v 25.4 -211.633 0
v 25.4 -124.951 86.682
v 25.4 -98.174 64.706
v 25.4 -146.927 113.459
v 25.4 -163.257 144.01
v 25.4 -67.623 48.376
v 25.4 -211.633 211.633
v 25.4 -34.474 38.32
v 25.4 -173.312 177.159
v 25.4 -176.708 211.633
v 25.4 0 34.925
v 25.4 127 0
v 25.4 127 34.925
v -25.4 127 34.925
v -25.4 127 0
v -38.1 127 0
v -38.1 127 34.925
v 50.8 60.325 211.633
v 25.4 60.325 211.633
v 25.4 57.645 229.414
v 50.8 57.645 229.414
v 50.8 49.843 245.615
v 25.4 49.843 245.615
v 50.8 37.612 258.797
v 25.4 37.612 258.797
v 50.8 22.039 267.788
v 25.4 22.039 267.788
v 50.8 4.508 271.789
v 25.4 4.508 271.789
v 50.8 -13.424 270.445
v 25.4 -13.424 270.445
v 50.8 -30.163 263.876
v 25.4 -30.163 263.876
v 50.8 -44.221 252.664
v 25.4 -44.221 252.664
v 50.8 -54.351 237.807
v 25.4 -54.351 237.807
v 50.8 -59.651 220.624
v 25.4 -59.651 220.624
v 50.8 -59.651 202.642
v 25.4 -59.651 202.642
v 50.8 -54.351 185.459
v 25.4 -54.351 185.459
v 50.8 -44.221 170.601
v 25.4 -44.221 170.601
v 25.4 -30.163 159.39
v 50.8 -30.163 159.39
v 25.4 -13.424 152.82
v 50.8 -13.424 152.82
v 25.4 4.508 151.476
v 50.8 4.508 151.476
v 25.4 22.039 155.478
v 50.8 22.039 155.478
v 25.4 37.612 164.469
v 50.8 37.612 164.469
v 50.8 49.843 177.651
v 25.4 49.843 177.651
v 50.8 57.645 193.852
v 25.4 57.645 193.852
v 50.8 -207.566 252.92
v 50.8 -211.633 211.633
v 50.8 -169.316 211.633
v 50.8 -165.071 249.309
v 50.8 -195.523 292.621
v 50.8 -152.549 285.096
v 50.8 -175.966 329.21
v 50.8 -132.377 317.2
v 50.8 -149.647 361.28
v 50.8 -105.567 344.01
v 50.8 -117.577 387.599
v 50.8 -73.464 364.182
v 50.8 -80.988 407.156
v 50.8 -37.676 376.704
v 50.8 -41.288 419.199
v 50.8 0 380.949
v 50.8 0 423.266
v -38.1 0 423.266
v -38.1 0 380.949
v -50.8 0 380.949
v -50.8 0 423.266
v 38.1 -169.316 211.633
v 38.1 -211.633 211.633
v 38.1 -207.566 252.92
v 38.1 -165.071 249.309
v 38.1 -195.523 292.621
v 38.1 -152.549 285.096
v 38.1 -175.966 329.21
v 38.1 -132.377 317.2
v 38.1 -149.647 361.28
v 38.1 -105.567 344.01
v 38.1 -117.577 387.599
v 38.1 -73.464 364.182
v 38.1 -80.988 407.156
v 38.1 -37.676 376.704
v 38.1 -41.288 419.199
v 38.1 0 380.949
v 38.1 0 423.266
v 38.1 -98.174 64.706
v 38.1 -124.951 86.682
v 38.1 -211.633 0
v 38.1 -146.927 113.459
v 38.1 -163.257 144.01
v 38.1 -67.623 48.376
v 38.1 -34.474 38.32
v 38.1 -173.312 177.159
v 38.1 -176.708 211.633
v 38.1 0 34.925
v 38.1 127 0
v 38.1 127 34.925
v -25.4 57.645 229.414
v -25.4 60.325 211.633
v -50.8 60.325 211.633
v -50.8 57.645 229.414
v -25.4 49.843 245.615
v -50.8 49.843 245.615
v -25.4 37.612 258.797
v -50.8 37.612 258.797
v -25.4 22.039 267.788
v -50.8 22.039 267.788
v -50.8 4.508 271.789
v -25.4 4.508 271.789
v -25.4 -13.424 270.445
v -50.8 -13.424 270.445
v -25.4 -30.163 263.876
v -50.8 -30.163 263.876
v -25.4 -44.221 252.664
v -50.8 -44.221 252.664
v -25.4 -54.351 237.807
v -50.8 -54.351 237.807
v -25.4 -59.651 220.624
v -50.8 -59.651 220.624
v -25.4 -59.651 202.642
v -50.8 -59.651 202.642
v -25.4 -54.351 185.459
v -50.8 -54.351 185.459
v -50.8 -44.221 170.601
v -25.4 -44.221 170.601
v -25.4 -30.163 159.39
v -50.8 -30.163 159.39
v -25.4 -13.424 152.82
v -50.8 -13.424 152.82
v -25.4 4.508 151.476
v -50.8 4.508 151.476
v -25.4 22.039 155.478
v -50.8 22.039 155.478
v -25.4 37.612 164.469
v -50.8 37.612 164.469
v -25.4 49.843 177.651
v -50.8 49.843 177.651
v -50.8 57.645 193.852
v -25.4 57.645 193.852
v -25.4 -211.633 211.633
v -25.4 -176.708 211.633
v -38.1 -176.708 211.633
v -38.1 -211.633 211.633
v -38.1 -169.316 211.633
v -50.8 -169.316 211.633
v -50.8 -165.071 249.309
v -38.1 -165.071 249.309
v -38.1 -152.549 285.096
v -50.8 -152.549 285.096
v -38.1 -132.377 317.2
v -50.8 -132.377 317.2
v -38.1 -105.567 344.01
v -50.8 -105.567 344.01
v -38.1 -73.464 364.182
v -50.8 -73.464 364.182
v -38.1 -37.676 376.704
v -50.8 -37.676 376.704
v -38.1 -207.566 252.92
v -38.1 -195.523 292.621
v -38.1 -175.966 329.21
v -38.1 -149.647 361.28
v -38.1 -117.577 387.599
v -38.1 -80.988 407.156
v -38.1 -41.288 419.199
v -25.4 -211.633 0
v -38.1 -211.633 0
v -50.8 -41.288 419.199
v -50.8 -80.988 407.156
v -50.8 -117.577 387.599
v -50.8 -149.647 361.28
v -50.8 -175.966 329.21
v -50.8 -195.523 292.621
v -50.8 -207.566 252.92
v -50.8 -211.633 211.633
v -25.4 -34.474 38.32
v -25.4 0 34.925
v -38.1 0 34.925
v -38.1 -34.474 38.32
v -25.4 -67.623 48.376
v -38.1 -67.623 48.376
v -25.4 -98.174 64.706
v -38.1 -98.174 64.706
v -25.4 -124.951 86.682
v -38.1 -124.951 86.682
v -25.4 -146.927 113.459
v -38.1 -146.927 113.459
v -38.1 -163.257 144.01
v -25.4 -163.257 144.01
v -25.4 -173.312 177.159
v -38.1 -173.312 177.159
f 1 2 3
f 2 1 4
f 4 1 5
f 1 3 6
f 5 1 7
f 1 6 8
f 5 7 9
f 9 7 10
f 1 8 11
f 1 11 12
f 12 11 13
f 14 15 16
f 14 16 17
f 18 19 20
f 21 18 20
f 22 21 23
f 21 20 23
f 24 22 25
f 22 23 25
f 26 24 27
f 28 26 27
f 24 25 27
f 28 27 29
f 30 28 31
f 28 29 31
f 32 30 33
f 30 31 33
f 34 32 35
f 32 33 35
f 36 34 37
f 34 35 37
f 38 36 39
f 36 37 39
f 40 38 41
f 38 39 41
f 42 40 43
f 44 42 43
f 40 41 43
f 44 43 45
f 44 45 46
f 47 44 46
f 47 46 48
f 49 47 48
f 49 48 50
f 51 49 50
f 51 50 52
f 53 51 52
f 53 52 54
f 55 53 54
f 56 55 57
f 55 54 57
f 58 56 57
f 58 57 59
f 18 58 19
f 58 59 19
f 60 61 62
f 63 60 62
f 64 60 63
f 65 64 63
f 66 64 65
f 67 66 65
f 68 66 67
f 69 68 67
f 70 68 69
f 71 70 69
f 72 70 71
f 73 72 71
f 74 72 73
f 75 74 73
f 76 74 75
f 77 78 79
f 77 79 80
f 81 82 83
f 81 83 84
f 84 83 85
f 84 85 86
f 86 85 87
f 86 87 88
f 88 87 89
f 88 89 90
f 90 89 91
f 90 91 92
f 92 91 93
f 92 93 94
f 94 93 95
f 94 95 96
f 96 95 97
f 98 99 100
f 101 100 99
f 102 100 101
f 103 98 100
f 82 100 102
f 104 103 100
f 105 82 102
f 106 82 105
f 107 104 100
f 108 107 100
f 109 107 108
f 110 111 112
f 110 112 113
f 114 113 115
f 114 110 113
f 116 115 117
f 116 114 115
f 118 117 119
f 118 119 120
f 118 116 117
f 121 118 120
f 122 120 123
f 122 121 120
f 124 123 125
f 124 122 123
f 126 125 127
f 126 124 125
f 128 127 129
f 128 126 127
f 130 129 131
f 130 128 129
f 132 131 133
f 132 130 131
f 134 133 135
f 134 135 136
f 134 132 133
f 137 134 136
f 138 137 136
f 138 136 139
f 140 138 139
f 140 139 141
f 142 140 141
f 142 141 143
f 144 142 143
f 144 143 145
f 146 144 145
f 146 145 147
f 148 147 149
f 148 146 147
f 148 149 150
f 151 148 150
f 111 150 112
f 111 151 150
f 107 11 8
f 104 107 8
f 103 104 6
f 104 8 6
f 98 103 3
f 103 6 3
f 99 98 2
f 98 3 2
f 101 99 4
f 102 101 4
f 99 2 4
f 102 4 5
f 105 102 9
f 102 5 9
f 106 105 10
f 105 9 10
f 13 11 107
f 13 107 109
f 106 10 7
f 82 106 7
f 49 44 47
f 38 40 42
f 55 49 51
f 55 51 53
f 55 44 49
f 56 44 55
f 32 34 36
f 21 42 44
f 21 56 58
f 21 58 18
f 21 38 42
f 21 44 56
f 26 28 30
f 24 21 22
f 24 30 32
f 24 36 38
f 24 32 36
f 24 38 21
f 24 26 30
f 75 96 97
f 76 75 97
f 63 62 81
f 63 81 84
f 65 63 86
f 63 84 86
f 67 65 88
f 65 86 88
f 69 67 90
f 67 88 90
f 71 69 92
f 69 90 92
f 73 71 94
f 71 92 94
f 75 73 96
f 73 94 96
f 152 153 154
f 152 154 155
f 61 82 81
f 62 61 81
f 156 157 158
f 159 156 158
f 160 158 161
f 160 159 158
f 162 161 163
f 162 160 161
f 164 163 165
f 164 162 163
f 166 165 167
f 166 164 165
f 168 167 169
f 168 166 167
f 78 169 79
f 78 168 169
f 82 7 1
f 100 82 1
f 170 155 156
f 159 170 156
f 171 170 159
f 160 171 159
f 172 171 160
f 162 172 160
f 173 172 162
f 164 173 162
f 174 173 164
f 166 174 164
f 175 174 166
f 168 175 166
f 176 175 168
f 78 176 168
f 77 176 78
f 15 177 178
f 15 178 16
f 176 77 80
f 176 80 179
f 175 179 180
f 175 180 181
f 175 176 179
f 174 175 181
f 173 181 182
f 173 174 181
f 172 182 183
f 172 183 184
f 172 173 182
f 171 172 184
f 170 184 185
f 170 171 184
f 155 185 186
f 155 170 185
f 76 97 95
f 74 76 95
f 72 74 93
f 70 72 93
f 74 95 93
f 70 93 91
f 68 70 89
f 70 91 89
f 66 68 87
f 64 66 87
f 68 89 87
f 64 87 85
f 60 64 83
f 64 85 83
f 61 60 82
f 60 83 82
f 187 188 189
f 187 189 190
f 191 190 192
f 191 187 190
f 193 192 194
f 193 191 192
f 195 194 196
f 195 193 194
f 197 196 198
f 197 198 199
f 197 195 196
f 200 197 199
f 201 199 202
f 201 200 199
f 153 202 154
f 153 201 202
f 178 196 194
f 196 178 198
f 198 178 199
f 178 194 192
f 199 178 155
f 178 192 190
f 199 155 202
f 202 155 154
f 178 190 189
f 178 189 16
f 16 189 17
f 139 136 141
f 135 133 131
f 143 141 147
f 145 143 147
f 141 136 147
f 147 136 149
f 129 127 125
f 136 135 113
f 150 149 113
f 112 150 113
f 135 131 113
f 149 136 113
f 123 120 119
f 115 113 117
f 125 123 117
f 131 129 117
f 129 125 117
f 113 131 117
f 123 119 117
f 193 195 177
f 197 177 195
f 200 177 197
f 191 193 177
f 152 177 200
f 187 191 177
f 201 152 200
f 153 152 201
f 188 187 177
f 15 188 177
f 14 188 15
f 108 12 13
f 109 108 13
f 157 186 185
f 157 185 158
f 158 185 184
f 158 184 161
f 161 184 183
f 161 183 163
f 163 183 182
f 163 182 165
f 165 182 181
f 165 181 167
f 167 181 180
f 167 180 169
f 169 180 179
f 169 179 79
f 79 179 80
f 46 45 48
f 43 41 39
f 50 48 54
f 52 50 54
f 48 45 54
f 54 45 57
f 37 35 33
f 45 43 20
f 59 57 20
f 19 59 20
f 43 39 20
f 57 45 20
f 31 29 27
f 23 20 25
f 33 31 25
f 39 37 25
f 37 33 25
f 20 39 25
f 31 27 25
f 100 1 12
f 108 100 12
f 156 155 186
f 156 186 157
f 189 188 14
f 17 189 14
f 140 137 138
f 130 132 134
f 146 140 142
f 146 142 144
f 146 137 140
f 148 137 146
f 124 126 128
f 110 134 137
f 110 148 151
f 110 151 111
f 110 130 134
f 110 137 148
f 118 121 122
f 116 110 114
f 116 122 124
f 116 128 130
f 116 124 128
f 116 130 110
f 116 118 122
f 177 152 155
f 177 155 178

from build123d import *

# Parameters (mm, degrees)
F4_R      = 60.325
F5_DEPTH  = 25.4
F4_W      = 127
F4_H      = 34.925
F6_DEPTH  = 12.7
F7_DEPTH  = 12.7
F10_DEPTH = 12.7


# Not quite as in the source:
# - a variable given as a bare number and used for a length is read in inches; the dataset says mm whatever the document's units were


with BuildPart() as f5:
    # F4 (on offset) → F5 (new body)
    with BuildSketch(Plane.YZ.offset(25.4)):
        with Locations((0, 211.6328)):
            Circle(F4_R)
    extrude(amount=F5_DEPTH)


with BuildPart() as f6:
    # F4 (on offset) → F6 (new body)
    with BuildSketch(Plane.YZ.offset(25.4)):
        with BuildLine():
            ThreePointArc((-211.6328, 211.6328), (-149.6469880015, 61.9858119985), (0, 0))
            Line((0, 0), (0, 34.925))
            ThreePointArc((0, 34.925), (-124.9512836686, 86.6815163314), (-176.7078, 211.6328))
            Line((-176.7078, 211.6328), (-211.6328, 211.6328))
        make_face()
        with Locations((63.5, 17.4625)):
            Rectangle(F4_W, F4_H)
    extrude(amount=F6_DEPTH)

    # F4 (on offset) → F7 (join)
    with BuildSketch(Plane.YZ.offset(25.4)):
        with BuildLine():
            Line((-211.6328, 0), (0, 0))
            ThreePointArc((0, 0), (-149.6469880015, 61.9858119985), (-211.6328, 211.6328))
            Line((-211.6328, 211.6328), (-211.6328, 0))
        make_face()
    extrude(amount=F7_DEPTH)


with BuildPart() as f10:
    # F9 (on offset) → F10 (new body)
    with BuildSketch(Plane.YZ.offset(38.1)):
        with BuildLine():
            ThreePointArc((-169.3164, 211.6328), (-119.7247746061, 331.3575746061), (0, 380.9492))
            Line((0, 380.9492), (0, 423.2656))
            ThreePointArc((0, 423.2656), (-149.6469880015, 361.2797880015), (-211.6328, 211.6328))
            Line((-211.6328, 211.6328), (-169.3164, 211.6328))
        make_face()
    extrude(amount=F10_DEPTH)


with BuildPart() as f11_1:
    # F11: instance of F10
    add(f10.part.mirror(Plane.YZ))


with BuildPart() as f11_2:
    # F11: instance of F5
    add(f5.part.mirror(Plane.YZ))


with BuildPart() as f11_3:
    # F11: instance of F6
    add(f6.part.mirror(Plane.YZ))


solid = Compound([f5.part, f6.part, f10.part, f11_1.part, f11_2.part, f11_3.part])
